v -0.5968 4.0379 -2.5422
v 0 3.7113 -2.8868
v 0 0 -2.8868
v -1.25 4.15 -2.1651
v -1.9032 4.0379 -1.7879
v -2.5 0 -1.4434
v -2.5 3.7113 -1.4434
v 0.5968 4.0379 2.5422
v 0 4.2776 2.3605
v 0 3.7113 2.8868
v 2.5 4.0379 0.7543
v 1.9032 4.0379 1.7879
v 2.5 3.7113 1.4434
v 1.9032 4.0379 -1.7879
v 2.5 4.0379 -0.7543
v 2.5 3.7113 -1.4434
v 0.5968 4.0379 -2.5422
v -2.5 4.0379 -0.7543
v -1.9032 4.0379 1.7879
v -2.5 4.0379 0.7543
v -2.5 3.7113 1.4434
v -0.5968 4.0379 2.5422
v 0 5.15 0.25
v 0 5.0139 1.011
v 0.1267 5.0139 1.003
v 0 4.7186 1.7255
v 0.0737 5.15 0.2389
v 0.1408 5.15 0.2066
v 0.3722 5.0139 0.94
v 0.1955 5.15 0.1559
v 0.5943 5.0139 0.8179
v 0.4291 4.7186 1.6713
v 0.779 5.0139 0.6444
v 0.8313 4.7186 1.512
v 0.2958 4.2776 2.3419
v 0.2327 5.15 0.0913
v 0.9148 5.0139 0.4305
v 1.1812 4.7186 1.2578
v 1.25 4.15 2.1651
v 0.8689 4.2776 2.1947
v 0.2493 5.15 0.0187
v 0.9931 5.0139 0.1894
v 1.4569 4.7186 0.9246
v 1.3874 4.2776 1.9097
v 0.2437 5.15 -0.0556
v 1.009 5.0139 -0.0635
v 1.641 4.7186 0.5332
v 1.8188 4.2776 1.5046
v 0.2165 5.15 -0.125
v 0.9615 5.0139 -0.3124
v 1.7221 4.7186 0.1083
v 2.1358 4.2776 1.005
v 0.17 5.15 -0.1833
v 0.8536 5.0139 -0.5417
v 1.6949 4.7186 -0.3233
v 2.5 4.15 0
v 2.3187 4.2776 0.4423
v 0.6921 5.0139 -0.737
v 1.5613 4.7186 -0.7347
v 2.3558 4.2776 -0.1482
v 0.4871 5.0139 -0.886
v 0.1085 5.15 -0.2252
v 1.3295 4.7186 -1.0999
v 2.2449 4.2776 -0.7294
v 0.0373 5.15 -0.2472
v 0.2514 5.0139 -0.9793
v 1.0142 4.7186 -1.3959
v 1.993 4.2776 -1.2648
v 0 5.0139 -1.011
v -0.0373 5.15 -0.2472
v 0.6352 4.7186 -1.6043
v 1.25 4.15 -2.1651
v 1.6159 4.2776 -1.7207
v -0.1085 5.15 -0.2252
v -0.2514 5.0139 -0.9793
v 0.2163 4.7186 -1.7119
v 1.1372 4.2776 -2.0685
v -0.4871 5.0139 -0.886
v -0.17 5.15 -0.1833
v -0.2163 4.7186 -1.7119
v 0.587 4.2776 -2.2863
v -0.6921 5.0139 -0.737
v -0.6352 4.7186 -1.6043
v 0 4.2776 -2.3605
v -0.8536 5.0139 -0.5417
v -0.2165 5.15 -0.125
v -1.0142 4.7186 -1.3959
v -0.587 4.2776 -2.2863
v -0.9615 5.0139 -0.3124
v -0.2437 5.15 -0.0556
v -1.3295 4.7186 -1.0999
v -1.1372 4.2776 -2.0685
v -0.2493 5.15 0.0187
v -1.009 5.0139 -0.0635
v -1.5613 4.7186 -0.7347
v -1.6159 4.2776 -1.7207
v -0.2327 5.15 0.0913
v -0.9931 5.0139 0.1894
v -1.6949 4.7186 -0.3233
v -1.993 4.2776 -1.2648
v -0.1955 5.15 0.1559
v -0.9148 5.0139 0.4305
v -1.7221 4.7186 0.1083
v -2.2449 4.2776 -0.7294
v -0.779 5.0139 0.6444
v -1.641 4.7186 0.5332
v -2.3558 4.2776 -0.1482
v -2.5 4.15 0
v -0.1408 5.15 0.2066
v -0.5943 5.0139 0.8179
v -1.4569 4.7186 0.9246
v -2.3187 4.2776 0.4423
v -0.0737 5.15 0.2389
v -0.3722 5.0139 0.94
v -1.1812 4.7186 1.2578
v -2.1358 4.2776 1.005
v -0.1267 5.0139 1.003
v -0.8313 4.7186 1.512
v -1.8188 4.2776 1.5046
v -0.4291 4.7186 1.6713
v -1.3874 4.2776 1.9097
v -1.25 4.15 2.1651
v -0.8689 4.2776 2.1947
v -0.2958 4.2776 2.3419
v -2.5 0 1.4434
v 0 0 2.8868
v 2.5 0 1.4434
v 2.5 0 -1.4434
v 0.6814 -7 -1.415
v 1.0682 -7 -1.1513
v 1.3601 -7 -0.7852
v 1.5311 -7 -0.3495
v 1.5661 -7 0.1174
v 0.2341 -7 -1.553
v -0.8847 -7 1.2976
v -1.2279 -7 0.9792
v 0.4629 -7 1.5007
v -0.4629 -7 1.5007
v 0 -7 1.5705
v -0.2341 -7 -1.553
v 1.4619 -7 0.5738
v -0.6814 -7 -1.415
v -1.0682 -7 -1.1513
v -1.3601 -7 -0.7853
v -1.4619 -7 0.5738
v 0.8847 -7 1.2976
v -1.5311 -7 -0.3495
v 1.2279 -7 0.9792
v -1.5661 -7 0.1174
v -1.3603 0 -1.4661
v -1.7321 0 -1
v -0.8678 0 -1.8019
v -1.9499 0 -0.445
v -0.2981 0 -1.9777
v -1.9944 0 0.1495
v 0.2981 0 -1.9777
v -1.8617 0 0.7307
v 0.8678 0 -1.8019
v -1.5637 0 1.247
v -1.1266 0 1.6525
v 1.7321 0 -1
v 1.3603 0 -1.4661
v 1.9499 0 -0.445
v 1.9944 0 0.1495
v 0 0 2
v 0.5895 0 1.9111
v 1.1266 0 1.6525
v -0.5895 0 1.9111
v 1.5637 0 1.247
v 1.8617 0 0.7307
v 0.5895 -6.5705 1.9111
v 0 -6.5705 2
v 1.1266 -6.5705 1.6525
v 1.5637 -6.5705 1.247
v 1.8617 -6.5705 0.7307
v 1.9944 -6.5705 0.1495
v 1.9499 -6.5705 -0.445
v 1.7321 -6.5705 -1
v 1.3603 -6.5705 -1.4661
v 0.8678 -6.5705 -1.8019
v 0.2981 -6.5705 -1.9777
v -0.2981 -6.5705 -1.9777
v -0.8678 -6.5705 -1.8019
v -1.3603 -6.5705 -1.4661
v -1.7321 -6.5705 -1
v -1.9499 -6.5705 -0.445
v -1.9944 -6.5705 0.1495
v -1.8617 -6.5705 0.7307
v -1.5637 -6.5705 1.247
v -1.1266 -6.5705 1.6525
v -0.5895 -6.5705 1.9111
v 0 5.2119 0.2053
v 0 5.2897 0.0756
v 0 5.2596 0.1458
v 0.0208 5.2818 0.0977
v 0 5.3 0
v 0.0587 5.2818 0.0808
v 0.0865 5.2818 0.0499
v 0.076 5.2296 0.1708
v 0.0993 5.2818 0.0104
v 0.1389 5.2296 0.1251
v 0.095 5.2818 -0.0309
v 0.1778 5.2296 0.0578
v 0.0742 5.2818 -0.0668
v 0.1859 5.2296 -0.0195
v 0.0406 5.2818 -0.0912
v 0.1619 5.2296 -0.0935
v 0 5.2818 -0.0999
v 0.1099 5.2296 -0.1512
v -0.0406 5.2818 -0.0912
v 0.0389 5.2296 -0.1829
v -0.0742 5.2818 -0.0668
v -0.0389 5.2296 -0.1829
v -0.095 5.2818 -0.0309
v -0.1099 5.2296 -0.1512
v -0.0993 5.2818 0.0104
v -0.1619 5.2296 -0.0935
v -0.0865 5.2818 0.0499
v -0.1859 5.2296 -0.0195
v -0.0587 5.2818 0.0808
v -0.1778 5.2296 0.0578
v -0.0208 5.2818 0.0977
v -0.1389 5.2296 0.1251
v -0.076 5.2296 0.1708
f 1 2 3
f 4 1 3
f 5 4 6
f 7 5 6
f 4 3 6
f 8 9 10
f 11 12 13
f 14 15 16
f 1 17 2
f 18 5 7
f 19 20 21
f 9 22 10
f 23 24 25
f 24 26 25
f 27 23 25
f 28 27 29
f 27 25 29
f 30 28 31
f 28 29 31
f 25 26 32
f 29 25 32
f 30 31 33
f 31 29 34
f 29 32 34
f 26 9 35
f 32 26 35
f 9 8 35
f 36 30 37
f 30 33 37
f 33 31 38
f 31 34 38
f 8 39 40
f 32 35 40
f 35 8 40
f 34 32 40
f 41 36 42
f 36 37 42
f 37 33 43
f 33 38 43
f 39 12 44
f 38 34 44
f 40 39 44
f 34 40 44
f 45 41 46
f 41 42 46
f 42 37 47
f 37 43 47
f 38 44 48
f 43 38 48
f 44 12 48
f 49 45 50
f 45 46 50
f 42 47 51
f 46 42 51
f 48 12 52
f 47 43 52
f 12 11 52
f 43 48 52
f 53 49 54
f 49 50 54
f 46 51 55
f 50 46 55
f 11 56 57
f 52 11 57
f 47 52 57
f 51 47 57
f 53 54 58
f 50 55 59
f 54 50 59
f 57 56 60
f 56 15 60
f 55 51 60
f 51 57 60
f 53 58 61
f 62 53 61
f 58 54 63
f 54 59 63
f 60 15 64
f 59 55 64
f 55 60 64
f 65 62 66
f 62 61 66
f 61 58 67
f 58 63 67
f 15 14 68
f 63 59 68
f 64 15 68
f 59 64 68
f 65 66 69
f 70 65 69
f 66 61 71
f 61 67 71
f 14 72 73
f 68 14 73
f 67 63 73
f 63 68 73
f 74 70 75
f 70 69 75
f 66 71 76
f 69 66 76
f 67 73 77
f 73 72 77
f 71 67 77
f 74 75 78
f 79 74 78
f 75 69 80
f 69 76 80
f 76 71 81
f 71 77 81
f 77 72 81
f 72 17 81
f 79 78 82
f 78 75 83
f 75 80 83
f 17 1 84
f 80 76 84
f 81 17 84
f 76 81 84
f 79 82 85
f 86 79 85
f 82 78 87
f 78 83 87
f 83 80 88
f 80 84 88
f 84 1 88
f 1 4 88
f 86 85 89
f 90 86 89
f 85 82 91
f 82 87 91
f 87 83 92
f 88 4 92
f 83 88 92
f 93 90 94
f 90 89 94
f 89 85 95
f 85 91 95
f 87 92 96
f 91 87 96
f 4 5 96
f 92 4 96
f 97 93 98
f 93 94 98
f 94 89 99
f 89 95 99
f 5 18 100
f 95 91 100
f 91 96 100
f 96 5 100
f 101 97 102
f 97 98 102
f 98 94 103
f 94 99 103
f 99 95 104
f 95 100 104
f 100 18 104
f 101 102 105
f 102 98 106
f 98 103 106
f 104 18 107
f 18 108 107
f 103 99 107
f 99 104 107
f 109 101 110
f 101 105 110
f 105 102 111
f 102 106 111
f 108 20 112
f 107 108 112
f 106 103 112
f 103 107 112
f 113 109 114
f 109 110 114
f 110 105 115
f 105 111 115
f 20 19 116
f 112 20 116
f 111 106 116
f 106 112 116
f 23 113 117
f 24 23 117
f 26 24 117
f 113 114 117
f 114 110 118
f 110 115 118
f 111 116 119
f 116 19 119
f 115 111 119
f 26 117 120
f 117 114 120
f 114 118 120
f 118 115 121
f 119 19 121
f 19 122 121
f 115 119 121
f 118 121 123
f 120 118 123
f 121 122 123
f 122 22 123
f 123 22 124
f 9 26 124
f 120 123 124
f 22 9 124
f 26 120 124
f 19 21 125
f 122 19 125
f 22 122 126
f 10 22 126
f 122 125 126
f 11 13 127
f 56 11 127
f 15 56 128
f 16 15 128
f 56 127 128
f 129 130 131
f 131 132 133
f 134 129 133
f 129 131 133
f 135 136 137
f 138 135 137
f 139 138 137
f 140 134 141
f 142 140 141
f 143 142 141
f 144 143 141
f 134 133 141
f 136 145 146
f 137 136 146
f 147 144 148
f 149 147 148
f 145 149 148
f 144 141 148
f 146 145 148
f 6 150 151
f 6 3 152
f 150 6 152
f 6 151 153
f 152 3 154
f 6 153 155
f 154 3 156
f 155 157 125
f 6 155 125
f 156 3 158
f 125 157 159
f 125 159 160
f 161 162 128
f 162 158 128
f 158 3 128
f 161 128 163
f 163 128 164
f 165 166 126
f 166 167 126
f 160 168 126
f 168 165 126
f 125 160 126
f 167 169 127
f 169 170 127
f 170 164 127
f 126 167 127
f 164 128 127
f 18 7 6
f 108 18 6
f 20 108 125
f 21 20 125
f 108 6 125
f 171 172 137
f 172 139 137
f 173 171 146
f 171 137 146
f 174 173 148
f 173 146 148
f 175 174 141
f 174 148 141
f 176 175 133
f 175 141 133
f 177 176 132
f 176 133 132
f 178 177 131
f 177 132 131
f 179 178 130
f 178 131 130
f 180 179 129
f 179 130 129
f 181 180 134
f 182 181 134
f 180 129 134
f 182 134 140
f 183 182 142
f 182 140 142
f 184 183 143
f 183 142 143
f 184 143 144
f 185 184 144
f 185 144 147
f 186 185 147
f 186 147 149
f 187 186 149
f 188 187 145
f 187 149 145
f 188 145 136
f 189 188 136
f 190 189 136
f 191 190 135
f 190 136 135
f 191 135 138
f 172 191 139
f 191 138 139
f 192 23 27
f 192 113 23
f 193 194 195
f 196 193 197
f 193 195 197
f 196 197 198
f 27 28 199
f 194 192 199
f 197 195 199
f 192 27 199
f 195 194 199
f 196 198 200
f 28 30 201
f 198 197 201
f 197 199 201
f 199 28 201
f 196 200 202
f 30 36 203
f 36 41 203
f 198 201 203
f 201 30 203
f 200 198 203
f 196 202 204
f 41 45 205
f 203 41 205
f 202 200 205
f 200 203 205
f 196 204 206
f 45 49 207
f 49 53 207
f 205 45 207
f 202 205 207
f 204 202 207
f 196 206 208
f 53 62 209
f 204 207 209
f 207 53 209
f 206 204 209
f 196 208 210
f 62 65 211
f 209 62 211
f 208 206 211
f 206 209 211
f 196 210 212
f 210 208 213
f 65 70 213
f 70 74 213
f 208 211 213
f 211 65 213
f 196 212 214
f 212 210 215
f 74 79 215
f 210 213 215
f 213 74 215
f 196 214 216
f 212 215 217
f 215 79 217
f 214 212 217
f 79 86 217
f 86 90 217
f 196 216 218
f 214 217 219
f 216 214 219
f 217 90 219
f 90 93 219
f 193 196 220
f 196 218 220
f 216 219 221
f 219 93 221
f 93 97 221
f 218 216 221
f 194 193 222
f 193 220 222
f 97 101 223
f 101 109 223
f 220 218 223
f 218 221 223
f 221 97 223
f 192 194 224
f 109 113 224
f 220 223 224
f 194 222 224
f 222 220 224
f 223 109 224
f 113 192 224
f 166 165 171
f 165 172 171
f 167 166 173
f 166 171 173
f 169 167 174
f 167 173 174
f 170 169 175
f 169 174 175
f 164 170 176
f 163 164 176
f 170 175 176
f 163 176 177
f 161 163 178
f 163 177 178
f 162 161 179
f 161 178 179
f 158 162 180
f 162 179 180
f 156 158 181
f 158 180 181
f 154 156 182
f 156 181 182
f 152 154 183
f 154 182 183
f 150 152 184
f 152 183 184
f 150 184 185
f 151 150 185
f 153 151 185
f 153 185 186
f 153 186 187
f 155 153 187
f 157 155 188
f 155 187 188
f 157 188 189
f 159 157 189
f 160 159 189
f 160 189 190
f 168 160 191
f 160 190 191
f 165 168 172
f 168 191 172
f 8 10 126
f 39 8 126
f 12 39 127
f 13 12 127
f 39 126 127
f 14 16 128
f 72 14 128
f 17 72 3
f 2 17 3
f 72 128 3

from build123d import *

# Parameters (mm, degrees)
SKETCH_2_R          = 5
CUT_EXTRUDE_1_DEPTH = 5.3


with BuildPart() as part:
    # Эскиз1 → Повернуть1 (revolve)
    with BuildSketch(Plane.XY, mode=Mode.PRIVATE) as revolve_1_sk:
        with BuildLine():
            Line((3, 3.550626861), (3, 0))
            Line((3, 0), (2, 0))
            Line((2, 0), (2, -6.5705))
            Line((2, -6.5705), (1.5705, -7))
            Line((1.5705, -7), (0, -7))
            Line((0, -7), (0, 5.3))
            ThreePointArc((0, 5.3), (0.145773797, 5.259622996), (0.25, 5.15))
            ThreePointArc((0.25, 5.15), (1.811111153, 4.670317349), (3, 3.550626861))
        make_face()
    revolve(revolve_1_sk.sketch.rotate(Axis((0, -7, 0), (0, 1, 0)), 270), axis=Axis((0, -7, 0), (0, 1, 0)))

    # Эскиз2 → Вырез-Вытянуть1 (cut)
    with BuildSketch(Plane(origin=(0, 0, 0), x_dir=(1, 0, 0), z_dir=(0, 1, 0))):
        Circle(SKETCH_2_R)
        Polygon((-2.5, 1.443375673), (-2.5, -1.443375673), (0, -2.886751346), (2.5, -1.443375673), (2.5, 1.443375673), (0, 2.886751346), align=None, mode=Mode.SUBTRACT)
    extrude(amount=CUT_EXTRUDE_1_DEPTH, mode=Mode.SUBTRACT)


solid = part.part
